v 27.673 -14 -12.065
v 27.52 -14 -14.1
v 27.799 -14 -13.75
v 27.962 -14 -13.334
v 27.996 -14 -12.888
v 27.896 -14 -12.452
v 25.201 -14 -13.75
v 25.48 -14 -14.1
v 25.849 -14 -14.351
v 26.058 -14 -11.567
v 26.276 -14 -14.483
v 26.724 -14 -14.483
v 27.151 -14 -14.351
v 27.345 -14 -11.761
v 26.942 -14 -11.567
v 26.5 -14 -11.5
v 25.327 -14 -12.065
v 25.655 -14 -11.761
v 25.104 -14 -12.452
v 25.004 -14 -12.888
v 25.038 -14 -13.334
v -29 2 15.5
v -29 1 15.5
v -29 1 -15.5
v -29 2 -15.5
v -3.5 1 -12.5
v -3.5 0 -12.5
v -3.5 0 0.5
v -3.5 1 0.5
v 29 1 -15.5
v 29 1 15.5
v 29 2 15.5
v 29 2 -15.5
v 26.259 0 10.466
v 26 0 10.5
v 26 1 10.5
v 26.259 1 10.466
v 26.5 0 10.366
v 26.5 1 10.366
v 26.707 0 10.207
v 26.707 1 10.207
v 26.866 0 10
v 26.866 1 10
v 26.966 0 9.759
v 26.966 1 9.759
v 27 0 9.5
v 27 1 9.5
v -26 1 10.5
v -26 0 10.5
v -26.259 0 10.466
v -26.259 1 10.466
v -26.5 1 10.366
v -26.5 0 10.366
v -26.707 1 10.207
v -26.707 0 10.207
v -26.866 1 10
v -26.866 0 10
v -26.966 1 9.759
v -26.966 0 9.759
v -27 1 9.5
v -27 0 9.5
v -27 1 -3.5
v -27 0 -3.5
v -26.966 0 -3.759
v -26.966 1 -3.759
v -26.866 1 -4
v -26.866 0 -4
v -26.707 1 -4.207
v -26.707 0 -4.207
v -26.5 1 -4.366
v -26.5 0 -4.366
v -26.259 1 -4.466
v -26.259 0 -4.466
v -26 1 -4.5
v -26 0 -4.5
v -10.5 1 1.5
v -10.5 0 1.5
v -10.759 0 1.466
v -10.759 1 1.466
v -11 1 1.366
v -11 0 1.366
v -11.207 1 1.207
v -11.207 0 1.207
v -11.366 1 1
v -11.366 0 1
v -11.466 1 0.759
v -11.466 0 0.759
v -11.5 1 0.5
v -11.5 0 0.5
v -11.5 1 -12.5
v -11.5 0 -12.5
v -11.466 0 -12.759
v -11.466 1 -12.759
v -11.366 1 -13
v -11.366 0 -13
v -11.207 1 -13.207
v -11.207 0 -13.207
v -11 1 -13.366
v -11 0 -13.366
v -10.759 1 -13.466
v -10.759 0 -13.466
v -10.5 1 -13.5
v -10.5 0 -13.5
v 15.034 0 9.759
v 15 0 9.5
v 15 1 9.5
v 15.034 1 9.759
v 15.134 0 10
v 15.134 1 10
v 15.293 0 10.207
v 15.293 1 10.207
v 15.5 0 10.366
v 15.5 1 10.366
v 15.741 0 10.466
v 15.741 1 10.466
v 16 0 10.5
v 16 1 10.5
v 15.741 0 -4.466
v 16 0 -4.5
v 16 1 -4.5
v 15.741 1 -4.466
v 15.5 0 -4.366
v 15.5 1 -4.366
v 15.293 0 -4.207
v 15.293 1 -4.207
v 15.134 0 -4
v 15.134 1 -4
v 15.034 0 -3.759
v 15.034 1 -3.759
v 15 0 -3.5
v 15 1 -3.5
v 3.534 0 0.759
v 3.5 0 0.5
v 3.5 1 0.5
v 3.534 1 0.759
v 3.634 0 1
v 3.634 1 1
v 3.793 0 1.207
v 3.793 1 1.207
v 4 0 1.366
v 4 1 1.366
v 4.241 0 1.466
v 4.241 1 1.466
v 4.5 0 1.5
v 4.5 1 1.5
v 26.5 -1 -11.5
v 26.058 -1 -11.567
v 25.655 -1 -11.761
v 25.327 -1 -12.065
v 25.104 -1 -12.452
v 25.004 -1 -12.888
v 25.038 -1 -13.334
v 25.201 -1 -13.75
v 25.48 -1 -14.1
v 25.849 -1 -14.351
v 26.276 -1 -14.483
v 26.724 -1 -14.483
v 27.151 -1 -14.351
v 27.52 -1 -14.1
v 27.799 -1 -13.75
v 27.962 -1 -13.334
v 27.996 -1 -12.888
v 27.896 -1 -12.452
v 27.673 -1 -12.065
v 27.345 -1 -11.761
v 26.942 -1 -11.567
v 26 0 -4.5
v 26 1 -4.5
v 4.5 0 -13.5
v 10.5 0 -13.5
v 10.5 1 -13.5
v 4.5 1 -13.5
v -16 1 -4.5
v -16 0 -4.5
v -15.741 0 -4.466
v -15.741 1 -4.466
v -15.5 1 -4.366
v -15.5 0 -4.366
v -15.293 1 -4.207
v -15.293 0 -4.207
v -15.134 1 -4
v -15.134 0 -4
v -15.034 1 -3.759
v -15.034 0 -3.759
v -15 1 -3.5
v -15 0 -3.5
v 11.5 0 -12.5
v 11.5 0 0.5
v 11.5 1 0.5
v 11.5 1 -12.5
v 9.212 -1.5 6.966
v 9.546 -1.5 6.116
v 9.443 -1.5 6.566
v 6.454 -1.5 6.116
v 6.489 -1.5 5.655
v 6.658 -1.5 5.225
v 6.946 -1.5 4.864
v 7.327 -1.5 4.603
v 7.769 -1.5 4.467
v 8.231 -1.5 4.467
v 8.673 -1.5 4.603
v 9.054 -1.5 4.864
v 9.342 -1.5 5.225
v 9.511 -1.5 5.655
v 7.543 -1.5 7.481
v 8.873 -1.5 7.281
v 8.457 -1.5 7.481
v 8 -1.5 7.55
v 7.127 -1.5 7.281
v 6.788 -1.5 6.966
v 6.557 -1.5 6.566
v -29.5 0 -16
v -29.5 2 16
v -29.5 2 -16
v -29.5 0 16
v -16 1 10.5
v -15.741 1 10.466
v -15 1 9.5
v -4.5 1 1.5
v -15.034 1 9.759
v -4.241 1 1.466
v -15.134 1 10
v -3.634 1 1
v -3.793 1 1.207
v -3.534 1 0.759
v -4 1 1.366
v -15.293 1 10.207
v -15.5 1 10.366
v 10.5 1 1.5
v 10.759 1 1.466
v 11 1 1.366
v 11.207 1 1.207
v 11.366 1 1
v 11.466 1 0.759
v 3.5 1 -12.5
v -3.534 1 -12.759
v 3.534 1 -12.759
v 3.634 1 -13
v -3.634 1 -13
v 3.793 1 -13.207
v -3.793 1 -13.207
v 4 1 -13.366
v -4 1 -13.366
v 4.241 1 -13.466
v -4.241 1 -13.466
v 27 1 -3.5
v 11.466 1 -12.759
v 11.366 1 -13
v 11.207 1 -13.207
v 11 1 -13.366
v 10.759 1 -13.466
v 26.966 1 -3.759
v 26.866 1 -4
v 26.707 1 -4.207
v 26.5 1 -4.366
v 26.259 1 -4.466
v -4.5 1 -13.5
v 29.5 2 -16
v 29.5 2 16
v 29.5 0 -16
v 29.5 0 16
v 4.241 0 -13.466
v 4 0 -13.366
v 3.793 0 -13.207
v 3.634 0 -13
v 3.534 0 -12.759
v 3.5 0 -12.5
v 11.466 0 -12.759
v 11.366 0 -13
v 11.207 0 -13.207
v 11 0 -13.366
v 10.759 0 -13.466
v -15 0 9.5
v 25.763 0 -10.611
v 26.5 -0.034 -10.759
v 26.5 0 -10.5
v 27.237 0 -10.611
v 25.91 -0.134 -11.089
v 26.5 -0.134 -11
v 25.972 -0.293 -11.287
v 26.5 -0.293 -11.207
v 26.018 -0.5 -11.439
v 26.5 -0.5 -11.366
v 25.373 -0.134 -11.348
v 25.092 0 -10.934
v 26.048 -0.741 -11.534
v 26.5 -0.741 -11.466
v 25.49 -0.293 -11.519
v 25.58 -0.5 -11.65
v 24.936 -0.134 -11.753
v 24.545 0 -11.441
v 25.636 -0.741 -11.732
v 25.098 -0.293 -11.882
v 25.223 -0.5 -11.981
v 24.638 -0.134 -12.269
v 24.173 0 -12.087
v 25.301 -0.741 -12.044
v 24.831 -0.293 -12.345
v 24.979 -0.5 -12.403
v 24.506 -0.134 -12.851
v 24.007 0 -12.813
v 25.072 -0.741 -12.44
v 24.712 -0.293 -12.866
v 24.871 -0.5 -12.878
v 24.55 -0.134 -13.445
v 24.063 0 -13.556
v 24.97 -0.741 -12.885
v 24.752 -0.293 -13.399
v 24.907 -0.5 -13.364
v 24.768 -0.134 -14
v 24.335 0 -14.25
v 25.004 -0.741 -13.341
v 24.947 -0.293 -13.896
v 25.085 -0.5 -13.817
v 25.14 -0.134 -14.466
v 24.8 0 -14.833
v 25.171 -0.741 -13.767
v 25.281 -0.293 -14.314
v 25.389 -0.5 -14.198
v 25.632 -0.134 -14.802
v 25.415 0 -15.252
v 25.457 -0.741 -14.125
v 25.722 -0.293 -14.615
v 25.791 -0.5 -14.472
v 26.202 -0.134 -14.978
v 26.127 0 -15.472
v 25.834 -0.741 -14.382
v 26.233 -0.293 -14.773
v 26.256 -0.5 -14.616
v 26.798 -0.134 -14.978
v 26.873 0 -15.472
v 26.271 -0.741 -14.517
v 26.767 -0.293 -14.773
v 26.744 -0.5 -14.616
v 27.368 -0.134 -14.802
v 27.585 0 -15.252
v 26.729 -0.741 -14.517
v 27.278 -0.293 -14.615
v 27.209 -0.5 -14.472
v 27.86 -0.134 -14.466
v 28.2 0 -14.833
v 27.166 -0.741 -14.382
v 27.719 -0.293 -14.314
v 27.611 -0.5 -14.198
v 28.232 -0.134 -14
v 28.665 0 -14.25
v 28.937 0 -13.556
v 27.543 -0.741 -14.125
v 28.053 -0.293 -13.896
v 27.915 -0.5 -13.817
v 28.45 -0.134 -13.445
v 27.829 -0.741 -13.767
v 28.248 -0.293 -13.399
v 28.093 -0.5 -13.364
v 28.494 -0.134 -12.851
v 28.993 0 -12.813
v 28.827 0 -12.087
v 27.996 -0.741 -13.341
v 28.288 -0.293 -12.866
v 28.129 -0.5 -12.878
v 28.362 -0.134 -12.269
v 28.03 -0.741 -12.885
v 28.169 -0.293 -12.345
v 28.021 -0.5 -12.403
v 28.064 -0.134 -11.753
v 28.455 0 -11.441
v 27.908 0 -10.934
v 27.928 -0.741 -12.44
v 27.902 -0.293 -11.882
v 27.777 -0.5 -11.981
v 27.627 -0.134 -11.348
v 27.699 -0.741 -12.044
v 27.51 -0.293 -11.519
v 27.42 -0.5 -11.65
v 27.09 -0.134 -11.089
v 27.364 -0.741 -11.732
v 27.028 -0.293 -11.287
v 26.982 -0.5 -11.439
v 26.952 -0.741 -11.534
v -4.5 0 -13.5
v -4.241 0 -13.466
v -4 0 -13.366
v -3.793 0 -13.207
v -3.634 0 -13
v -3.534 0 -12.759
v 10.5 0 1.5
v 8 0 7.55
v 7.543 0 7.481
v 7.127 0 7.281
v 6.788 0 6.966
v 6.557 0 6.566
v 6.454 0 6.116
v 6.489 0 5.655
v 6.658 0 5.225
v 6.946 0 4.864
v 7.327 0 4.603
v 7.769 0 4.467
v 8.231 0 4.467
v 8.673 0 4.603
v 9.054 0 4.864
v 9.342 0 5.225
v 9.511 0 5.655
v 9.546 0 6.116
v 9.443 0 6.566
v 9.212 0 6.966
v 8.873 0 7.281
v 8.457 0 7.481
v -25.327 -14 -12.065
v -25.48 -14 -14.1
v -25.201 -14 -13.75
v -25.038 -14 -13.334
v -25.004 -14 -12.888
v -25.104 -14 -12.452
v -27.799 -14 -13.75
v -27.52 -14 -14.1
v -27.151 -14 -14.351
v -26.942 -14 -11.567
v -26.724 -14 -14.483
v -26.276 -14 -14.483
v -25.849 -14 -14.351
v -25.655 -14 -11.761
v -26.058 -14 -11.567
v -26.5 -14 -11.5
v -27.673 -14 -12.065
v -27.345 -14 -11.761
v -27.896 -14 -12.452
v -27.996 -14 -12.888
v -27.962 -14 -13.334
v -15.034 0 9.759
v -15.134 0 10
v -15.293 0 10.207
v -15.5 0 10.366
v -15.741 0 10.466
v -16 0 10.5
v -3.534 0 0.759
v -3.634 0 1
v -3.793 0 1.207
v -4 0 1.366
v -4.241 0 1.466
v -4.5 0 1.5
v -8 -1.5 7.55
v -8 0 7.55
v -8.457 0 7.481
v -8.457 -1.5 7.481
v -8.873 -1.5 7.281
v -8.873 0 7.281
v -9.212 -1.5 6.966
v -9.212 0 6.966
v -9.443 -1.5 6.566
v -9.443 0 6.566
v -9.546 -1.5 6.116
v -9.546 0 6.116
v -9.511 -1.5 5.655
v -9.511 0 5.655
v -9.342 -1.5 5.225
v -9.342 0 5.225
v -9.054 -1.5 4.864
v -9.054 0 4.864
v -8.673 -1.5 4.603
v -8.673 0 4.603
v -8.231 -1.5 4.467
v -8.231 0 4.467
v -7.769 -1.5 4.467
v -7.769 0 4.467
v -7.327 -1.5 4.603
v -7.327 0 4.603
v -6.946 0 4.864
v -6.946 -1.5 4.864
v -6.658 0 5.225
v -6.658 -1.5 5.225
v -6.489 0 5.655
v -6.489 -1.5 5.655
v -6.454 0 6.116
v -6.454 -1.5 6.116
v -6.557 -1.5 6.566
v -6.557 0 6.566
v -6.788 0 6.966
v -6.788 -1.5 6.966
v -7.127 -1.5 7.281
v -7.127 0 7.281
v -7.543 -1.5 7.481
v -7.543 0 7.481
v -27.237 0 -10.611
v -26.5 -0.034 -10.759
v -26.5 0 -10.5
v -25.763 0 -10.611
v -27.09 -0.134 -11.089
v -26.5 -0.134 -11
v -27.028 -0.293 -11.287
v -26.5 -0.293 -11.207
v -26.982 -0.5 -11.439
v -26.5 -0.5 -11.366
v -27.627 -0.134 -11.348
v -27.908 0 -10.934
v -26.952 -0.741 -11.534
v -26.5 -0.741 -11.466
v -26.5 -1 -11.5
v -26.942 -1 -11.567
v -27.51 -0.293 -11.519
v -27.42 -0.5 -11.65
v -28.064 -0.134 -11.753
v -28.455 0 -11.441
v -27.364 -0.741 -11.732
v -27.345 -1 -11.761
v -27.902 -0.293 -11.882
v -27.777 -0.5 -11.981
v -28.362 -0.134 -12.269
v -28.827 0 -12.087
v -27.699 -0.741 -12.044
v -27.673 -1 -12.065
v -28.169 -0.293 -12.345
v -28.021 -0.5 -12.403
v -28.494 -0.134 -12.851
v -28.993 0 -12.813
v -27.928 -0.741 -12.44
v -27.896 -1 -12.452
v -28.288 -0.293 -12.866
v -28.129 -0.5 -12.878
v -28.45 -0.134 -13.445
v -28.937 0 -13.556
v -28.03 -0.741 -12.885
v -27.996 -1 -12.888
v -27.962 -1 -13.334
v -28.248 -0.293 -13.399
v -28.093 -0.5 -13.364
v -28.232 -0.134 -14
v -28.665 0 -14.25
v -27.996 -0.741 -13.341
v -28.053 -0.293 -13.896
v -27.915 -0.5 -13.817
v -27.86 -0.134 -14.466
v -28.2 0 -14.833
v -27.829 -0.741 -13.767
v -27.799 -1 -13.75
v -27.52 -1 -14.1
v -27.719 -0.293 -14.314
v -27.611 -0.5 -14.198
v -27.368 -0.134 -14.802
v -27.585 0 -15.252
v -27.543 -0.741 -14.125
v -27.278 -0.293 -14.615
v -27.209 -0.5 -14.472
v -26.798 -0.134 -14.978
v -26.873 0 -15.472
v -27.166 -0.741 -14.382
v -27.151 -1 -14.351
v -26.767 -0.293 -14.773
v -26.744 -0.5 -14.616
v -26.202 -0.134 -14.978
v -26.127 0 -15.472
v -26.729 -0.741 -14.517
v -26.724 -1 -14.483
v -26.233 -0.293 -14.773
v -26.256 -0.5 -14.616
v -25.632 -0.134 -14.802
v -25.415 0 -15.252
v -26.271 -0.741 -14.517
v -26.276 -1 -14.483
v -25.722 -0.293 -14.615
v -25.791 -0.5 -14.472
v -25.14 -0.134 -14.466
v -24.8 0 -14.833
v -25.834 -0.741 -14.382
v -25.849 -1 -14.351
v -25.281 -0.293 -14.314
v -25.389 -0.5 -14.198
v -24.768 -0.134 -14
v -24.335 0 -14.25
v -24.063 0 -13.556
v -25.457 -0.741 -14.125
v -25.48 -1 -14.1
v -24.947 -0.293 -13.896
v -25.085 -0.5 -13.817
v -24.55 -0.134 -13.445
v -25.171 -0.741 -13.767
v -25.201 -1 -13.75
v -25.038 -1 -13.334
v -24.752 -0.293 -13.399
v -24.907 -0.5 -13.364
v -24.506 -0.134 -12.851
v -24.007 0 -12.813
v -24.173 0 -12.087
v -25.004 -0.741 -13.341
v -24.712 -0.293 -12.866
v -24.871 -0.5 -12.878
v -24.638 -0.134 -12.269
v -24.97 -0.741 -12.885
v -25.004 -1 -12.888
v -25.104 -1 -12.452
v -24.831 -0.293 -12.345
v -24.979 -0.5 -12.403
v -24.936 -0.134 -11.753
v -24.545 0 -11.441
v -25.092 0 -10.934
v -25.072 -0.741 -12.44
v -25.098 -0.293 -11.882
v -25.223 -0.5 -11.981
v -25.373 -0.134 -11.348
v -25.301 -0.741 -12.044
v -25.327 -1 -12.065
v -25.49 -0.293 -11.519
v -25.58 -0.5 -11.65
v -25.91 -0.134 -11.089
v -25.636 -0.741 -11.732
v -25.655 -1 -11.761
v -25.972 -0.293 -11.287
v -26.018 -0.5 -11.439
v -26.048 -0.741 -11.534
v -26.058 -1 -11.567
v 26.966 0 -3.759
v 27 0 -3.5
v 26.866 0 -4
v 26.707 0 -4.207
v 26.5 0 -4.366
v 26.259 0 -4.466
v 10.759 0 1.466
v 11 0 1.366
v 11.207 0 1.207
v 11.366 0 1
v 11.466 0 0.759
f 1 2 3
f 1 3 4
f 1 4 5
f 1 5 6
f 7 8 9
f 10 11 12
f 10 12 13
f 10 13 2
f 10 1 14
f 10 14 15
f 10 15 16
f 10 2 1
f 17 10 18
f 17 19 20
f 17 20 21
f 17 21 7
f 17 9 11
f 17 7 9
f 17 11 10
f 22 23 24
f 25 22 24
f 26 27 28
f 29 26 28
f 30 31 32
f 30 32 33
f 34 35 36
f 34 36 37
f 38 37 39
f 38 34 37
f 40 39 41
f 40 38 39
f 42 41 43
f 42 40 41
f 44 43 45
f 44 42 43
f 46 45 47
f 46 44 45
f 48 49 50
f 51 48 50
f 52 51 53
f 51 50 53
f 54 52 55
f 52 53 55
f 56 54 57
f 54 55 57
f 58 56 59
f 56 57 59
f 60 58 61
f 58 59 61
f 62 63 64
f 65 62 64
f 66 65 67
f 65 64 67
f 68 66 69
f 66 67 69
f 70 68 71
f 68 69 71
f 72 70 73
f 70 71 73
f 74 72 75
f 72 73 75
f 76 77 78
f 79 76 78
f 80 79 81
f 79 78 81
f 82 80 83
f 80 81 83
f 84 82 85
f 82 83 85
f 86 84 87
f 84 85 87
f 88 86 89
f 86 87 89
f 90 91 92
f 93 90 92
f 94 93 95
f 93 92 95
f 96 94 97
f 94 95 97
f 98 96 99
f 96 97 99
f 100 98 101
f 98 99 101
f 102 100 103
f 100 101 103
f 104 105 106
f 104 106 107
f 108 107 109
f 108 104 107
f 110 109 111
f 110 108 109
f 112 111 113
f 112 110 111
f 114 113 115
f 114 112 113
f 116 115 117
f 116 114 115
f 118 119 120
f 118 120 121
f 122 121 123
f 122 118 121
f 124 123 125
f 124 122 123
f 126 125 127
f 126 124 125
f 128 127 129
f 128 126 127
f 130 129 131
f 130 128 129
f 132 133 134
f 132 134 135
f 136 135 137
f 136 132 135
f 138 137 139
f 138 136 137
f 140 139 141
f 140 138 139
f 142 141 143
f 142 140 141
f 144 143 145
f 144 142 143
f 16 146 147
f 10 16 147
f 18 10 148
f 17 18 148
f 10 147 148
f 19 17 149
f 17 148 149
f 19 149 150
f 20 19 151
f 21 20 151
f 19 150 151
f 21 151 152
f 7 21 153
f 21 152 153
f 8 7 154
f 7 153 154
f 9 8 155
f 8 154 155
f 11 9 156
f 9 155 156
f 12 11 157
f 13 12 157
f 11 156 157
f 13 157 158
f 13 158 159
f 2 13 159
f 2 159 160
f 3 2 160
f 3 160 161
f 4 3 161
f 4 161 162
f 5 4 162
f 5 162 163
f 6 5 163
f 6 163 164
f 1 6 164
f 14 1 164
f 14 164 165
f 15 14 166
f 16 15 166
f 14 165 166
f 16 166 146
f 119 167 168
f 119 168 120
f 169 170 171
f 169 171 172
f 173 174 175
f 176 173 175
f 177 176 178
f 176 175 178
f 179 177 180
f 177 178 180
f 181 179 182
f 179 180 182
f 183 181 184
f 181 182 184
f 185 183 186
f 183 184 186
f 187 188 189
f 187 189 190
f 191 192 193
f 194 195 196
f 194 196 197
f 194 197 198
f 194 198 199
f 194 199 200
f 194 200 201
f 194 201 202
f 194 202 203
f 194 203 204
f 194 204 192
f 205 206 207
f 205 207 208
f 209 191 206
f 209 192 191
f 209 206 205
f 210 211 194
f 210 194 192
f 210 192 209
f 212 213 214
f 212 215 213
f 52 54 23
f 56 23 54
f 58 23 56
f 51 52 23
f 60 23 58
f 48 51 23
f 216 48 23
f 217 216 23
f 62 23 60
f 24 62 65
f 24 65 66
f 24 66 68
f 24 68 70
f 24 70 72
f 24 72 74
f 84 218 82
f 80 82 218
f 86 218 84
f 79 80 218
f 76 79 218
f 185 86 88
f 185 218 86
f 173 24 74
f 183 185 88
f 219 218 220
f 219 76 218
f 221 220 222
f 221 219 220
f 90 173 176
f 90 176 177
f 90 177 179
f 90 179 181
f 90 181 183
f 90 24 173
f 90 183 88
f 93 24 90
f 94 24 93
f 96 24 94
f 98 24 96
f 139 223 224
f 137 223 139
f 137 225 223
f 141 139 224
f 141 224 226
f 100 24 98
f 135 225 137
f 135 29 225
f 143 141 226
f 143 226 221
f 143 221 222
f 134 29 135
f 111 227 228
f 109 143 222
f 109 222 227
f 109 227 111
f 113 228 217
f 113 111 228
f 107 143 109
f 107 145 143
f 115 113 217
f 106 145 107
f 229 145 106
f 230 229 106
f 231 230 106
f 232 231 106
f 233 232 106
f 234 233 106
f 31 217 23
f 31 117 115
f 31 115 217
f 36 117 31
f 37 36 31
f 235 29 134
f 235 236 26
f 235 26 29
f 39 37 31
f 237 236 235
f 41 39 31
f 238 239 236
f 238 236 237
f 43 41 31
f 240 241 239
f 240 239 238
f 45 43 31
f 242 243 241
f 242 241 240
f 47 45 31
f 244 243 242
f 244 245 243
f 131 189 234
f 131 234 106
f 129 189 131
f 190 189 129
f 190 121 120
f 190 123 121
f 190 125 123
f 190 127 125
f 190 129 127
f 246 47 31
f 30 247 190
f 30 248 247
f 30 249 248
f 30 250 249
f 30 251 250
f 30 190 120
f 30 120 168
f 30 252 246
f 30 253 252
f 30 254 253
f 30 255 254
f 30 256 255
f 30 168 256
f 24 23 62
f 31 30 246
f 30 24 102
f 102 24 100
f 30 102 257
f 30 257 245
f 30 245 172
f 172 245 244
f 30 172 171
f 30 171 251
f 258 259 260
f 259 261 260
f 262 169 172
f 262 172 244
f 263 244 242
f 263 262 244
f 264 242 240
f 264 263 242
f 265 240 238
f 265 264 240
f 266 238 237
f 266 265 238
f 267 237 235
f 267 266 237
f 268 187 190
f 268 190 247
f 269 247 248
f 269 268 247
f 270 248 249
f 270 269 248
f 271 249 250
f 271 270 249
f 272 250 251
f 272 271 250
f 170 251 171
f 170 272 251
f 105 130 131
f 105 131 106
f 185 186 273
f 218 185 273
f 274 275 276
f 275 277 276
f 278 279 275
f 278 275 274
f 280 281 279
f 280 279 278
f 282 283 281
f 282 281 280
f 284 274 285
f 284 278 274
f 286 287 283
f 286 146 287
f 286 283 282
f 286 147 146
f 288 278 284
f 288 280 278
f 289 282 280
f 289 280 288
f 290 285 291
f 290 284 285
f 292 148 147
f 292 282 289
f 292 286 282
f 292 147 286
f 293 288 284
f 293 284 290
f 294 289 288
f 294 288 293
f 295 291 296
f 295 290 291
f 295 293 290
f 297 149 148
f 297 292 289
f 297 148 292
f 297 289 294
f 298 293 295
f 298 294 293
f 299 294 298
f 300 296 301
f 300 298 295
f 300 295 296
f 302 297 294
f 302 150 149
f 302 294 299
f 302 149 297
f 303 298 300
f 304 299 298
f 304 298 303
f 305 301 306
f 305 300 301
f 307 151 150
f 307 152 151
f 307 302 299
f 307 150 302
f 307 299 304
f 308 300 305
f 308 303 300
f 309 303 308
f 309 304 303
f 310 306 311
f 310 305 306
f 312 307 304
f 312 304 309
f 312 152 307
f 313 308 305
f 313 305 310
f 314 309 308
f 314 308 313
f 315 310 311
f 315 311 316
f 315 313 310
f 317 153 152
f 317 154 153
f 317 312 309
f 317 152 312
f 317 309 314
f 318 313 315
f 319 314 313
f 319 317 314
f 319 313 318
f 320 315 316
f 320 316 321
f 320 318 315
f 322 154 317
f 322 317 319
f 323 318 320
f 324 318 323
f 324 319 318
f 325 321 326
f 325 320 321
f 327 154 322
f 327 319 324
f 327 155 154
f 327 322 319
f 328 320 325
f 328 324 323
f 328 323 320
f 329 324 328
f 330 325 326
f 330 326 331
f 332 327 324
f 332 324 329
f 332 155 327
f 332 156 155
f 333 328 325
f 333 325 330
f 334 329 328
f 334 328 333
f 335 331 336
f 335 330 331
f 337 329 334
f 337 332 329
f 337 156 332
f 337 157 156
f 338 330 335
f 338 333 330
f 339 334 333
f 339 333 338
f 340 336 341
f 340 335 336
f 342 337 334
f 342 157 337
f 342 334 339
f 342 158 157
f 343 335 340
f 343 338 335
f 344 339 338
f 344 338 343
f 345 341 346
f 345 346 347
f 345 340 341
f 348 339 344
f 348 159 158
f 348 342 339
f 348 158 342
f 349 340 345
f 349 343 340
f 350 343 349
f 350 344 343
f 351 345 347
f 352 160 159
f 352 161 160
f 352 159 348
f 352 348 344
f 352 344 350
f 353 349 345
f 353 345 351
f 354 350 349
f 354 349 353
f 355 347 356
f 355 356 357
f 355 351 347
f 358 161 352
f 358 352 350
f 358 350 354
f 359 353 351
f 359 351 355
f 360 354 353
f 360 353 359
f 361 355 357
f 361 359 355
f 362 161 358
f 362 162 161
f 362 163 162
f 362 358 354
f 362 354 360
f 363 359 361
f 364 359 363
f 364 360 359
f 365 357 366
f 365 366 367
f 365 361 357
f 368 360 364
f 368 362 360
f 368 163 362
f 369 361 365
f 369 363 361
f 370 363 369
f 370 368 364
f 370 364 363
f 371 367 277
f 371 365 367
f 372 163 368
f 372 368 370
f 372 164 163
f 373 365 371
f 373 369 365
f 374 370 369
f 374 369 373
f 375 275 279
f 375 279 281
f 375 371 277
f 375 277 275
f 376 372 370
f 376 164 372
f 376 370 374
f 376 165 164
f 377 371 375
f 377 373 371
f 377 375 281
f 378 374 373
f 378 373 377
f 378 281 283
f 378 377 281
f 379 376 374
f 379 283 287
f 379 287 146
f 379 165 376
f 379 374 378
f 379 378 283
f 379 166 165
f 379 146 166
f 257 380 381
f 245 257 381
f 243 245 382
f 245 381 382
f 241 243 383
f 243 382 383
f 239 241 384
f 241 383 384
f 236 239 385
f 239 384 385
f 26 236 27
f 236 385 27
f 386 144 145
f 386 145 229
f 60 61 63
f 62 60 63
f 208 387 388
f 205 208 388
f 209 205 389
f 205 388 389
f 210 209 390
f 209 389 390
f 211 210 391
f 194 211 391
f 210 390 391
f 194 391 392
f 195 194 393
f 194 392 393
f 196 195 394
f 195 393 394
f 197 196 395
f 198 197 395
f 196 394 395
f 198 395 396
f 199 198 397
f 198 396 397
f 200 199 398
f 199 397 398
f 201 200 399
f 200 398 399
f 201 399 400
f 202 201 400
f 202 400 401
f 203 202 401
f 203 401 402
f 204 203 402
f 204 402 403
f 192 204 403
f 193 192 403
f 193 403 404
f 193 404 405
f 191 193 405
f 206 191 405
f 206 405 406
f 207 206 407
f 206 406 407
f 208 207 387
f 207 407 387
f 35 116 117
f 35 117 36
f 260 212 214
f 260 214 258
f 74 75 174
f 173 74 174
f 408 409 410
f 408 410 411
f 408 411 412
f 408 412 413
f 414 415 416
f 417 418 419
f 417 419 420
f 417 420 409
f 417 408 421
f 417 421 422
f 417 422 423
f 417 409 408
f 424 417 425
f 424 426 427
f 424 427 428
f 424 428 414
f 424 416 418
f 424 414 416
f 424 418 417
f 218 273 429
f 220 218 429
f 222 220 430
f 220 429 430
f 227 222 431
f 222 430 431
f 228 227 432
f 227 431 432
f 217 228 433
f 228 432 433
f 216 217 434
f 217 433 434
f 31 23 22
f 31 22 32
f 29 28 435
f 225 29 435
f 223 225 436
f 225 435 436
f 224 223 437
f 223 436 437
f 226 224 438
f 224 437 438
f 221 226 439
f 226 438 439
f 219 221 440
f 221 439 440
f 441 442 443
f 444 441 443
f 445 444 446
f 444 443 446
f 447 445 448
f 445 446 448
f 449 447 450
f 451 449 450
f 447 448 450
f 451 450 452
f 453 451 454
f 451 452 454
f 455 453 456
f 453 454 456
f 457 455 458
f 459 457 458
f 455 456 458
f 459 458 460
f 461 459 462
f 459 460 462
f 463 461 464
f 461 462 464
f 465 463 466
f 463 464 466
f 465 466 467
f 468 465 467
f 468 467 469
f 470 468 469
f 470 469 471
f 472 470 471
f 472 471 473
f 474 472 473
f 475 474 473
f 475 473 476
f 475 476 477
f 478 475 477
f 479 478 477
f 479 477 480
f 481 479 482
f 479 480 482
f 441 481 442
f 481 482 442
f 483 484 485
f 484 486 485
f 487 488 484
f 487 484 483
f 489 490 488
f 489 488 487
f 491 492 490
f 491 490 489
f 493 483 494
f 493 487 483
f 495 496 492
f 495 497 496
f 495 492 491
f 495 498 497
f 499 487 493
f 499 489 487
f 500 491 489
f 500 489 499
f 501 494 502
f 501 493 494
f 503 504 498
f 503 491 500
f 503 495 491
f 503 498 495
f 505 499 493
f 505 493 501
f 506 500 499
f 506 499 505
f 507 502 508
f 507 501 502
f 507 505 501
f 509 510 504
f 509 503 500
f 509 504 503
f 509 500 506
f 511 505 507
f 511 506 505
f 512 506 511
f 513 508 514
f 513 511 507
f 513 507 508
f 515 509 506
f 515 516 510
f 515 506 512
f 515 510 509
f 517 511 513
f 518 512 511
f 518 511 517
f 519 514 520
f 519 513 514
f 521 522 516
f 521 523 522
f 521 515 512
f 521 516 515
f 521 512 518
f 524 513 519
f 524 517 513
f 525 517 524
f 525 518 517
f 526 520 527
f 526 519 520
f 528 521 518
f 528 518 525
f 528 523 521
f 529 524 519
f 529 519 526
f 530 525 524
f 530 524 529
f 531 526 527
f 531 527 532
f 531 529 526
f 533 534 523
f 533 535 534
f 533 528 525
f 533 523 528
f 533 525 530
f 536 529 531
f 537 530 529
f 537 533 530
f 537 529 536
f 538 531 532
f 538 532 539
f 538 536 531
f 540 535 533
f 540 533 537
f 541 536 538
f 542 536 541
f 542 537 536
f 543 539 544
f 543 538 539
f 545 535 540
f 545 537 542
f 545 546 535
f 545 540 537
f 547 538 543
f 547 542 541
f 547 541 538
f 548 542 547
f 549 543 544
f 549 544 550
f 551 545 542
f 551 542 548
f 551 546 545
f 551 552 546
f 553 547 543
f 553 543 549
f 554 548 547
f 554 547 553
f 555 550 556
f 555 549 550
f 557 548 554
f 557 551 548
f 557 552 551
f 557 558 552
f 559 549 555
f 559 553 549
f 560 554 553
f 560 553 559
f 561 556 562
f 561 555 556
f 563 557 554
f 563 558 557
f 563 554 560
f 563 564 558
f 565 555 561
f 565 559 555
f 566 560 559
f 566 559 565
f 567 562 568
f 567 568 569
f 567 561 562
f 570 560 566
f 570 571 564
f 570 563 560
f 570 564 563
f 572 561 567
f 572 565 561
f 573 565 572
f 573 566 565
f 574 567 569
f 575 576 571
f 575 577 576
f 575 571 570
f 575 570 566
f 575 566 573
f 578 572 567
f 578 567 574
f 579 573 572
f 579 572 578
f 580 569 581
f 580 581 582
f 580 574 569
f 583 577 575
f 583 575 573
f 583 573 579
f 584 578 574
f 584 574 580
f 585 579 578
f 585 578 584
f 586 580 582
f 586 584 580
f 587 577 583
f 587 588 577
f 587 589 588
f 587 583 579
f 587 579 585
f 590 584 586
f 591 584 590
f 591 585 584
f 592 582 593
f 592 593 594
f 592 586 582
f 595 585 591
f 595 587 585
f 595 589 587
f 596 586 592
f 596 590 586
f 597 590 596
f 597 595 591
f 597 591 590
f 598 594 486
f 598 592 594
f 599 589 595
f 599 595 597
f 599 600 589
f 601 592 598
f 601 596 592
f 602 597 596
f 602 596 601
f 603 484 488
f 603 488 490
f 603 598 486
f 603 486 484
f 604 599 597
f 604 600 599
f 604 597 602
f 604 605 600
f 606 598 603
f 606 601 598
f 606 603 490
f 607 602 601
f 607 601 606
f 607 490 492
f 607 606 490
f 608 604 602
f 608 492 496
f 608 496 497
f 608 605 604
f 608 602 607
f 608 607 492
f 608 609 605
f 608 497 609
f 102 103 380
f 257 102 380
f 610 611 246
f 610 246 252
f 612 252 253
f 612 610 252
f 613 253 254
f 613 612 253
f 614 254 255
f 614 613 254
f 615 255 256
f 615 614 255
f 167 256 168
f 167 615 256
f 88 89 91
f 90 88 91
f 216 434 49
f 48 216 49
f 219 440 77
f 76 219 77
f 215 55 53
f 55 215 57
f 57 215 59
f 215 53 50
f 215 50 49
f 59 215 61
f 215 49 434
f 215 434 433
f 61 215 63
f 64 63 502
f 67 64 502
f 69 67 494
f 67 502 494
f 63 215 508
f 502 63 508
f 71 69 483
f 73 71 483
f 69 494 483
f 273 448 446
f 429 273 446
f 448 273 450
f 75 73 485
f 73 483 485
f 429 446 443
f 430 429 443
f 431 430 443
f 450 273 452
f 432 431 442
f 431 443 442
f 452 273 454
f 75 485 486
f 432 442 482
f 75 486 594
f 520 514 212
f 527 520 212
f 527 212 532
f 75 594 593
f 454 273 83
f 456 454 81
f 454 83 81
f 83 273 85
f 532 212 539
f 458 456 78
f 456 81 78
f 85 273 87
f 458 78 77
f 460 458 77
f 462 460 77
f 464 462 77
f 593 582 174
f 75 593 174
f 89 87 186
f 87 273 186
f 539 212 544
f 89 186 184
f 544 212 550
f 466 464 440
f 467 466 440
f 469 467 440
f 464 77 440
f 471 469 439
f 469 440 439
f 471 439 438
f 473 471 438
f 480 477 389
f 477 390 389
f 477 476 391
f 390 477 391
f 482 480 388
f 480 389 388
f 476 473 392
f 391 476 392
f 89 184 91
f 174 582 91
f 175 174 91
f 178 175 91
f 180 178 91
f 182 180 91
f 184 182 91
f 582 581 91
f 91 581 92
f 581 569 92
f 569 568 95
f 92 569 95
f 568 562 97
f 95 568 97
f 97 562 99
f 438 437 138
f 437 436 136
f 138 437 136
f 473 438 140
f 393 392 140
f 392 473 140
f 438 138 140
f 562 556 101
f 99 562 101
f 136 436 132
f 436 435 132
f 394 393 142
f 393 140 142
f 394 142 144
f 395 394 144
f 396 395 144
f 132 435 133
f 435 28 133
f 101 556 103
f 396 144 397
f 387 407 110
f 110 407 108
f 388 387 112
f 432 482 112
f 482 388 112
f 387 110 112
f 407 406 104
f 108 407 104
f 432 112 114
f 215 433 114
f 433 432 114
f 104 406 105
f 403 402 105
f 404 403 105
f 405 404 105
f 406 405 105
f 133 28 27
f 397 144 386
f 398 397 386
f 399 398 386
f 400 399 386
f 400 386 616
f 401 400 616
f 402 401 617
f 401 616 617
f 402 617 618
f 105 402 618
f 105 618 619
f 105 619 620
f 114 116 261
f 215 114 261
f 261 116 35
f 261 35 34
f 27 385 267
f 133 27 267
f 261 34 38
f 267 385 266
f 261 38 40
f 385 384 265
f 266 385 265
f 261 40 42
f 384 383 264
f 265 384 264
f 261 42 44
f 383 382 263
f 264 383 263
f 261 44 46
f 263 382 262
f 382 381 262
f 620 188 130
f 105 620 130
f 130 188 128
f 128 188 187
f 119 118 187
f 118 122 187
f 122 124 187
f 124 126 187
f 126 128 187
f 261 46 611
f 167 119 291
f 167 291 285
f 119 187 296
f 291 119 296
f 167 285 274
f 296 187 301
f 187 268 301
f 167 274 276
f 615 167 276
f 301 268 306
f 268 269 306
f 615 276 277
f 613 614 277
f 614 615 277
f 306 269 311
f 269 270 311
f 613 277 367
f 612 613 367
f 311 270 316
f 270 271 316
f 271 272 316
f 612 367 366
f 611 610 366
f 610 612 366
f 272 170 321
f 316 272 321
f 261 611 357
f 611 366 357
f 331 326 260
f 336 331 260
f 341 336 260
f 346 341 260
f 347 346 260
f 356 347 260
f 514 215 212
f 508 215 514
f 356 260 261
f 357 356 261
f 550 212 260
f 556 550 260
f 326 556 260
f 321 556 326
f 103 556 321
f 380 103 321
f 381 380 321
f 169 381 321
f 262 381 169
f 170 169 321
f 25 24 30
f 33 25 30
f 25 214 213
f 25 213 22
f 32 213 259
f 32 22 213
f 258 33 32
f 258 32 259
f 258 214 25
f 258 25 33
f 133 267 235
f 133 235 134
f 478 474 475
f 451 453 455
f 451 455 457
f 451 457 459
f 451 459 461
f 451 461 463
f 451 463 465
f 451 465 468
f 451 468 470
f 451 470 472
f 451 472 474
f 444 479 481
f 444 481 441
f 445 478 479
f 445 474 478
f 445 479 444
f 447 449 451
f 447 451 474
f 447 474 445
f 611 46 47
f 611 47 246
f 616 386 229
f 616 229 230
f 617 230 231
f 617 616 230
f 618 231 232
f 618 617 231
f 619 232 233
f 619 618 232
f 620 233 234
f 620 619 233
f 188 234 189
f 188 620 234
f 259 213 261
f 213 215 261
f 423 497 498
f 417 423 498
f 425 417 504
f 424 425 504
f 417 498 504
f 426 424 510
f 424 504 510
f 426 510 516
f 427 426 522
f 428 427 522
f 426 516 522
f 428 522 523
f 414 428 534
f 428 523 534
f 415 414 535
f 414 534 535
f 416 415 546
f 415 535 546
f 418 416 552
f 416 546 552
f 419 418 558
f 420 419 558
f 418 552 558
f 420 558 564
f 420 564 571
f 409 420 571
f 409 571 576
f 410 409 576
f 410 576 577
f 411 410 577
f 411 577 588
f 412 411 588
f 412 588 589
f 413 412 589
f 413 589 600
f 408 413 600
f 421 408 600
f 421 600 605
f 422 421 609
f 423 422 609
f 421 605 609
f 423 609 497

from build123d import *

# Parameters (mm, degrees)
SKIZZE1_W                       = 59
SKIZZE1_H                       = 32
AUFSATZ_LINEAR_AUSTRAGEN1_DEPTH = 1
SKIZZE3_W                       = 59
SKIZZE3_H                       = 32
SKIZZE3_W_2                     = 58
SKIZZE3_H_2                     = 31
AUFSATZ_LINEAR_AUSTRAGEN2_DEPTH = 1
SKIZZE4_R                       = 1.55
AUFSATZ_LINEAR_AUSTRAGEN3_DEPTH = 1.5
SKIZZE5_R                       = 1.5
AUFSATZ_LINEAR_AUSTRAGEN4_DEPTH = 14
VERRUNDUNG3_R                   = 1
SCHNITT_LINEAR_AUSTRAGEN2_DEPTH = 1


with BuildPart() as part:
    # Skizze1 → Aufsatz-Linear austragen1 (new body)
    with BuildSketch(Plane(origin=(0, 0, 0), x_dir=(1, 0, 0), z_dir=(0, 1, 0))):
        Rectangle(SKIZZE1_W, SKIZZE1_H)
    extrude(amount=AUFSATZ_LINEAR_AUSTRAGEN1_DEPTH)

    # Skizze3 → Aufsatz-Linear austragen2 (add)
    with BuildSketch(Plane(origin=(0, 1, 0), x_dir=(1, 0, 0), z_dir=(0, 1, 0))):
        Rectangle(SKIZZE3_W, SKIZZE3_H)
        Rectangle(SKIZZE3_W_2, SKIZZE3_H_2, mode=Mode.SUBTRACT)
    extrude(amount=AUFSATZ_LINEAR_AUSTRAGEN2_DEPTH)

    # Skizze4 → Aufsatz-Linear austragen3 (add)
    with BuildSketch(Plane.XZ):
        with Locations(Location((8, 6, 0), (0, 0, 90))):
            Circle(SKIZZE4_R)
        with Locations(Location((-8, 6, 0), (0, 0, 90))):
            Circle(SKIZZE4_R)
    extrude(amount=AUFSATZ_LINEAR_AUSTRAGEN3_DEPTH)

    # Skizze5 → Aufsatz-Linear austragen4 (add)
    with BuildSketch(Plane.XZ):
        with Locations(Location((26.5, -13, 0), (0, 0, 90))):
            Circle(SKIZZE5_R)
        with Locations(Location((-26.5, -13, 0), (0, 0, 90))):
            Circle(SKIZZE5_R)
    extrude(amount=AUFSATZ_LINEAR_AUSTRAGEN4_DEPTH)

    # Verrundung3
    verrundung3_edges = [part.edges().sort_by_distance(p)[0] for p in [
        (26.5, 0, -14.5),
        (-26.5, 0, -14.5),
    ]]
    fillet(verrundung3_edges, radius=VERRUNDUNG3_R)

    # Skizze6 → Schnitt-Linear austragen2 (cut)
    with BuildSketch(Plane.XZ):
        with BuildLine():
            Line((16, 10.5), (26, 10.5))
            ThreePointArc((26, 10.5), (26.707106781, 10.207106781), (27, 9.5))
            Line((27, 9.5), (27, -3.5))
            ThreePointArc((27, -3.5), (26.707106781, -4.207106781), (26, -4.5))
            Line((26, -4.5), (16, -4.5))
            ThreePointArc((16, -4.5), (15.292893219, -4.207106781), (15, -3.5))
            Line((15, -3.5), (15, 9.5))
            ThreePointArc((15, 9.5), (15.292893219, 10.207106781), (16, 10.5))
        make_face()
        with BuildLine():
            Line((4.5, 1.5), (10.5, 1.5))
            ThreePointArc((10.5, 1.5), (11.207106781, 1.207106781), (11.5, 0.5))
            Line((11.5, 0.5), (11.5, -12.5))
            ThreePointArc((11.5, -12.5), (11.207106781, -13.207106781), (10.5, -13.5))
            Line((10.5, -13.5), (4.5, -13.5))
            ThreePointArc((4.5, -13.5), (3.792893219, -13.207106781), (3.5, -12.5))
            Line((3.5, -12.5), (3.5, 0.5))
            ThreePointArc((3.5, 0.5), (3.792893219, 1.207106781), (4.5, 1.5))
        make_face()
        with BuildLine():
            Line((-11.5, 0.5), (-11.5, -12.5))
            ThreePointArc((-11.5, -12.5), (-11.207106781, -13.207106781), (-10.5, -13.5))
            Line((-10.5, -13.5), (-4.5, -13.5))
            ThreePointArc((-4.5, -13.5), (-3.792893219, -13.207106781), (-3.5, -12.5))
            Line((-3.5, -12.5), (-3.5, 0.5))
            ThreePointArc((-3.5, 0.5), (-3.792893219, 1.207106781), (-4.5, 1.5))
            Line((-4.5, 1.5), (-10.5, 1.5))
            ThreePointArc((-10.5, 1.5), (-11.207106781, 1.207106781), (-11.5, 0.5))
        make_face()
        with BuildLine():
            Line((-27, 9.5), (-27, -3.5))
            ThreePointArc((-27, -3.5), (-26.707106781, -4.207106781), (-26, -4.5))
            Line((-26, -4.5), (-16, -4.5))
            ThreePointArc((-16, -4.5), (-15.292893219, -4.207106781), (-15, -3.5))
            Line((-15, -3.5), (-15, 9.5))
            ThreePointArc((-15, 9.5), (-15.292893219, 10.207106781), (-16, 10.5))
            Line((-16, 10.5), (-26, 10.5))
            ThreePointArc((-26, 10.5), (-26.707106781, 10.207106781), (-27, 9.5))
        make_face()
    extrude(amount=-SCHNITT_LINEAR_AUSTRAGEN2_DEPTH, mode=Mode.SUBTRACT)


solid = part.part
